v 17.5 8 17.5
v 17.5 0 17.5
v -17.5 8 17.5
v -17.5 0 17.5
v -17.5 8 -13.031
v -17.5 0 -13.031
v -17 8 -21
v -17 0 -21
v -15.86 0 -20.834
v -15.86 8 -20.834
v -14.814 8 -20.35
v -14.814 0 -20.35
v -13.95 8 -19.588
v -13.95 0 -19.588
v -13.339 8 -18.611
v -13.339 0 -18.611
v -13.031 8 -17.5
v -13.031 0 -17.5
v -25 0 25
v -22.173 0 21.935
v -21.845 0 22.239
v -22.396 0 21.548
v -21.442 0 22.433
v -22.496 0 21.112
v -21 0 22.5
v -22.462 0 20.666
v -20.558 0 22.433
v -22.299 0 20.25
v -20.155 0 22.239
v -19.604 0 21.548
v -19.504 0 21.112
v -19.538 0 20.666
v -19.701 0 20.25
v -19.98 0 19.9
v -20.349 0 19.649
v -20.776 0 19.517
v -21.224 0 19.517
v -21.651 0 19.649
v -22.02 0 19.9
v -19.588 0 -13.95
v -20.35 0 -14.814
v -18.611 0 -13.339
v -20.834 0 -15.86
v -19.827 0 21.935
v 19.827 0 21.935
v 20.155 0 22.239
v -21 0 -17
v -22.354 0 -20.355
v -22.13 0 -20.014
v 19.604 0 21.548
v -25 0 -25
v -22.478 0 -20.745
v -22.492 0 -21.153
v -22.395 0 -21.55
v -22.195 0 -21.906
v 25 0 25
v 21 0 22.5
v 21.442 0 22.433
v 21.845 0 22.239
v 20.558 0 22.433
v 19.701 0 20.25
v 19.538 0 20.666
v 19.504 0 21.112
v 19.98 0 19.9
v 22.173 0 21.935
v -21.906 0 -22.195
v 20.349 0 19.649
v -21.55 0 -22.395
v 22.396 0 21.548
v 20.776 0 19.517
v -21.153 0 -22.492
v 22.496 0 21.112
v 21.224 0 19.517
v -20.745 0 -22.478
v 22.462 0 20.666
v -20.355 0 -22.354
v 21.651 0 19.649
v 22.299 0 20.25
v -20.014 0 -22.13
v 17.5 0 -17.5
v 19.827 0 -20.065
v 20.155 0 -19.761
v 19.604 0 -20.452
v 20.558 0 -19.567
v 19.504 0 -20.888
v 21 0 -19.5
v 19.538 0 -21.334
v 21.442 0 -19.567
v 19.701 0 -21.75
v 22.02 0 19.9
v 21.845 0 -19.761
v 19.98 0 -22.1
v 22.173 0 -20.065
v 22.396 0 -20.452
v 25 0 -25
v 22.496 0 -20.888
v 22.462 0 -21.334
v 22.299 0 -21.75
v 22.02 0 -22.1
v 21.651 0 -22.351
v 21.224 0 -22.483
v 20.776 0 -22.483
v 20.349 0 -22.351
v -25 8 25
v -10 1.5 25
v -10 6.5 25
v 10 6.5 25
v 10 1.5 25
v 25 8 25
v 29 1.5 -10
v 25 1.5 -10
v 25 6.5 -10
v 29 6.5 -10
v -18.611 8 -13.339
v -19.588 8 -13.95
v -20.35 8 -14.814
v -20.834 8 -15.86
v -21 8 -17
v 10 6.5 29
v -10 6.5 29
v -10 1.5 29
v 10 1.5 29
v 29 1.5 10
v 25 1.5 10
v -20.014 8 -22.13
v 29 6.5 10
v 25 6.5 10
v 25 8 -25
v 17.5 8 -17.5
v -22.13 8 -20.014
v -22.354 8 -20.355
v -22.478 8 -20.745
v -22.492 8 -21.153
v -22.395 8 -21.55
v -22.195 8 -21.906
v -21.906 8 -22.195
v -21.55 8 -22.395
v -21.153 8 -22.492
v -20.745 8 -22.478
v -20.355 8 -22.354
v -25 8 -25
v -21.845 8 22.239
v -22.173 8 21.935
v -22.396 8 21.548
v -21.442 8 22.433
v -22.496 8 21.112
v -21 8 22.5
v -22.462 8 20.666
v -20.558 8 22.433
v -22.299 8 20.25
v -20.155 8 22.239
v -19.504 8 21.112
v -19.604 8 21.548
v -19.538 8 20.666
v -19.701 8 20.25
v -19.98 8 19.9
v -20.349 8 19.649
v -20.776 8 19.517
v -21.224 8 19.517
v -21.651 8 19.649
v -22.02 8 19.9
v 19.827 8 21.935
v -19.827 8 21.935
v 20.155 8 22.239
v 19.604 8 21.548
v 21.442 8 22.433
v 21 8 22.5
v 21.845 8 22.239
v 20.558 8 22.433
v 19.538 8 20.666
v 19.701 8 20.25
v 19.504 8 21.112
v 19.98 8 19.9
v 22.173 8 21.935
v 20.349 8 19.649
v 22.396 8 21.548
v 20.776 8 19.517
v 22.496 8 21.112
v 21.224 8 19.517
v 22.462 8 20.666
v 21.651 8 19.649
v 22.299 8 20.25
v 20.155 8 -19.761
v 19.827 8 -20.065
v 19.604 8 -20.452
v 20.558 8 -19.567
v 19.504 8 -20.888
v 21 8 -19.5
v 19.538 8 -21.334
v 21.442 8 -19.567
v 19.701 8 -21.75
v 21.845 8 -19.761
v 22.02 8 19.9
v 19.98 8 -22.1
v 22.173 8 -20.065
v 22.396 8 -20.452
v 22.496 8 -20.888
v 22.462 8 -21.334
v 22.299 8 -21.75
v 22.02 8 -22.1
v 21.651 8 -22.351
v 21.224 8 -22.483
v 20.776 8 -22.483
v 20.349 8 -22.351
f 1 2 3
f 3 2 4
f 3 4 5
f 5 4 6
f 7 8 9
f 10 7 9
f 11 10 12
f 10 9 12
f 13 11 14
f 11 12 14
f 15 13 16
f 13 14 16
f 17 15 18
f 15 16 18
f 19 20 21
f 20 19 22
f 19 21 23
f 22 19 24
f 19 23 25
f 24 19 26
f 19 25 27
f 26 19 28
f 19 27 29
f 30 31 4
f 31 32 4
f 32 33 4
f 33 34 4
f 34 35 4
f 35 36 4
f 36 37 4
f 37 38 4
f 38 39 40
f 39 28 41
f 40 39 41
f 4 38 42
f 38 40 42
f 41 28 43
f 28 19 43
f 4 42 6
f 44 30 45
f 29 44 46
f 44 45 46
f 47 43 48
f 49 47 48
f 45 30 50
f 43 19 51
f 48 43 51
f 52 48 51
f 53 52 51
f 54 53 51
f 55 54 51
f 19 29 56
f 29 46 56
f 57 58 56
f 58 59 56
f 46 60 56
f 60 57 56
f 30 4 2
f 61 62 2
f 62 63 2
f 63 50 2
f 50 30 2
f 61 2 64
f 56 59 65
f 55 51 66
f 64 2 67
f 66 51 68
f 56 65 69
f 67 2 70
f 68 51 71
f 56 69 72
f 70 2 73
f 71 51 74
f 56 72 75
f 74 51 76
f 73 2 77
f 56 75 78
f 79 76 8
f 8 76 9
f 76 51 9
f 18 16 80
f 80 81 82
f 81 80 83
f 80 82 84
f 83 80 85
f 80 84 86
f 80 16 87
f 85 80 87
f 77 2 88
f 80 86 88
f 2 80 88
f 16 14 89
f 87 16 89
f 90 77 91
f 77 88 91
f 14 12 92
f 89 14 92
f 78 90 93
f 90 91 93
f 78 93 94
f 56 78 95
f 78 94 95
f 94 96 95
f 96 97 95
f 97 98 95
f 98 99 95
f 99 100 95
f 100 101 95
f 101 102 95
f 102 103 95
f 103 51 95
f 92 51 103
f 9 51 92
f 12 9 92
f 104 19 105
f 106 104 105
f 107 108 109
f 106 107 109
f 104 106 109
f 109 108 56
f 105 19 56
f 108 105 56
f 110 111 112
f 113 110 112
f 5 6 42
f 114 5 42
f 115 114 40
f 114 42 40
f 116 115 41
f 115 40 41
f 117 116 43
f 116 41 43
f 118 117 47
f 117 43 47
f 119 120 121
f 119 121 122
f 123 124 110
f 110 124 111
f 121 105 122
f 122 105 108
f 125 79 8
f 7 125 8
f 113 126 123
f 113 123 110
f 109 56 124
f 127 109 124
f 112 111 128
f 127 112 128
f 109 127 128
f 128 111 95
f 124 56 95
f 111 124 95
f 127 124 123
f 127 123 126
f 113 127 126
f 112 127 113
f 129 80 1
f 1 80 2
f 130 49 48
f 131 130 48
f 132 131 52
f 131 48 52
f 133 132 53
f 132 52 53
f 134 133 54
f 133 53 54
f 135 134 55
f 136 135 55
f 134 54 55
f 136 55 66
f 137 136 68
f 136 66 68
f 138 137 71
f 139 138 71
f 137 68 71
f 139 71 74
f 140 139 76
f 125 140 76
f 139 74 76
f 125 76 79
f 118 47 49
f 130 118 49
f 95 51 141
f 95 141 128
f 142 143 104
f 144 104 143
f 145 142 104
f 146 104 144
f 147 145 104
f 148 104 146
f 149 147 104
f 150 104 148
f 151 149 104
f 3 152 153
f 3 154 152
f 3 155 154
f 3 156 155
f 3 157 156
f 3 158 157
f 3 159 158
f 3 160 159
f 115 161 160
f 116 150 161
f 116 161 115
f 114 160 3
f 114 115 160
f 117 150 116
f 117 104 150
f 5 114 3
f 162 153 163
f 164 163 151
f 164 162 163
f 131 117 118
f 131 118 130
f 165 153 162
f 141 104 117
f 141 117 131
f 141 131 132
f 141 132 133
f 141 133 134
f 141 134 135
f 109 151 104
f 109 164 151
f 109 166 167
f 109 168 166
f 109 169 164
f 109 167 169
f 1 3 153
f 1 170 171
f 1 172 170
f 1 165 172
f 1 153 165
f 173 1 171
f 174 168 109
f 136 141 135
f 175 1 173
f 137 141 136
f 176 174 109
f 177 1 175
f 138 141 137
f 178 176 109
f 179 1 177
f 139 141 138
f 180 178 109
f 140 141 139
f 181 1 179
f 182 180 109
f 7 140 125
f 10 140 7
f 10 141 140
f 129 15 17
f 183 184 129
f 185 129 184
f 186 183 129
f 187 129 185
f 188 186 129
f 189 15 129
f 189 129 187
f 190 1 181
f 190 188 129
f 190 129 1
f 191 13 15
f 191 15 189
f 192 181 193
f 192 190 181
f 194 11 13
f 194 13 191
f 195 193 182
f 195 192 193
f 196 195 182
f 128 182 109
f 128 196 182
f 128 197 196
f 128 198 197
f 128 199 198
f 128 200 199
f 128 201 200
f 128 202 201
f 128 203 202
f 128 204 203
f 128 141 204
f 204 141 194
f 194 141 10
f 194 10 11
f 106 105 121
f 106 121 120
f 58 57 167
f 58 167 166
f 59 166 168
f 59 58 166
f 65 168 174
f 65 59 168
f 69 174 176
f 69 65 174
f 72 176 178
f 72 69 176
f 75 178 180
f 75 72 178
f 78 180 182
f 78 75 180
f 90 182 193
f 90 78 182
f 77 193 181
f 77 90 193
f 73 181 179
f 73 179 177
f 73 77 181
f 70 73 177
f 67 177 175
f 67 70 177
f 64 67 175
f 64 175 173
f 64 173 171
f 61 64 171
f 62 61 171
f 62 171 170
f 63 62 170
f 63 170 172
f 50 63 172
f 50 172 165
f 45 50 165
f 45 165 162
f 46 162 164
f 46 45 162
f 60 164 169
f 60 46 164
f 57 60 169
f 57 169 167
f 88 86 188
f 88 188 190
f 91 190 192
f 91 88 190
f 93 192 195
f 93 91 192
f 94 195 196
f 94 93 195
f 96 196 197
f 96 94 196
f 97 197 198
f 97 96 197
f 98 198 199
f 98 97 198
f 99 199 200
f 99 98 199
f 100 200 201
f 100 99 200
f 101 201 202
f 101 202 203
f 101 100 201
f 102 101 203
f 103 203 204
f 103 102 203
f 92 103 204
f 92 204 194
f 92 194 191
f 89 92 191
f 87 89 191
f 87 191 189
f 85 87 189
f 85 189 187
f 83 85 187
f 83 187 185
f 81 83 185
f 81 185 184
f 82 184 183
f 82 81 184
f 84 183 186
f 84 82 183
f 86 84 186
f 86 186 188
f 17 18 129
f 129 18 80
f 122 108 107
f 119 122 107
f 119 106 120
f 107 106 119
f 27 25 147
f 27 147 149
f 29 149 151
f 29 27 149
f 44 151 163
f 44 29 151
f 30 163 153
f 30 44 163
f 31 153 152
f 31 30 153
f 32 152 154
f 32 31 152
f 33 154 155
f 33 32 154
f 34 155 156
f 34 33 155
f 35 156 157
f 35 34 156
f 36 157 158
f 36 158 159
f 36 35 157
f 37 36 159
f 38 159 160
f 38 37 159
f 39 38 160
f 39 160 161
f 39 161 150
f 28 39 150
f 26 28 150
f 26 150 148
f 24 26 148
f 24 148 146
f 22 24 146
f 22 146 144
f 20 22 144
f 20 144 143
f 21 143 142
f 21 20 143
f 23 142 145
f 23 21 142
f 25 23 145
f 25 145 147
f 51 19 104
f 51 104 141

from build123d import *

# Parameters (mm, degrees)
SKETCH1_W         = 50
SKETCH1_H         = 50
SKETCH1_R         = 1.5
SUPPORT_DEPTH     = 8
SOUTH_START       = 25
SKETCH2_W         = 20
SKETCH2_H         = 5
SOUTH_DOWEL_DEPTH = 4
WEST_START        = 25
SKETCH3_W         = 20
SKETCH3_H         = 5
WEST_DOWEL_DEPTH  = 4


with BuildPart() as part:
    # Sketch1 → Support (new body)
    with BuildSketch(Plane(origin=(0, 0, 0), x_dir=(1, 0, 0), z_dir=(0, 1, 0))):
        Rectangle(SKETCH1_W, SKETCH1_H)
        with Locations(Location((-21, -21, 0), (0, 0, 270))):
            Circle(SKETCH1_R, mode=Mode.SUBTRACT)
        with Locations(Location((21, -21, 0), (0, 0, 270))):
            Circle(SKETCH1_R, mode=Mode.SUBTRACT)
        with BuildLine():
            Line((-13.031373033, 17.5), (17.5, 17.5))
            Line((17.5, 17.5), (17.5, -17.5))
            Line((17.5, -17.5), (-17.5, -17.5))
            Line((-17.5, -17.5), (-17.5, 13.031373033))
            ThreePointArc((-17.5, 13.031373033), (-20, 14.354248689), (-21, 17))
            Line((-21, 17), (-22.130136986, 20.01369863))
            ThreePointArc((-22.130136986, 20.01369863), (-22.060660172, 22.060660172), (-20.01369863, 22.130136986))
            Line((-20.01369863, 22.130136986), (-17, 21))
            ThreePointArc((-17, 21), (-14.354248689, 20), (-13.031373033, 17.5))
        make_face(mode=Mode.SUBTRACT)
        with Locations(Location((21, 21, 0), (0, 0, 270))):
            Circle(SKETCH1_R, mode=Mode.SUBTRACT)
    extrude(amount=SUPPORT_DEPTH)

    # Sketch2 → South Dowel (add)
    with BuildSketch(Plane.XY.offset(SOUTH_START)):
        with Locations((0, 4)):
            Rectangle(SKETCH2_W, SKETCH2_H)
    extrude(amount=SOUTH_DOWEL_DEPTH)

    # Sketch3 → West Dowel (add)
    with BuildSketch(Plane(origin=(0, 0, 0), x_dir=(0, 0, -1), z_dir=(1, 0, 0)).offset(WEST_START)):
        with Locations((0, 4)):
            Rectangle(SKETCH3_W, SKETCH3_H)
    extrude(amount=WEST_DOWEL_DEPTH)


solid = part.part
